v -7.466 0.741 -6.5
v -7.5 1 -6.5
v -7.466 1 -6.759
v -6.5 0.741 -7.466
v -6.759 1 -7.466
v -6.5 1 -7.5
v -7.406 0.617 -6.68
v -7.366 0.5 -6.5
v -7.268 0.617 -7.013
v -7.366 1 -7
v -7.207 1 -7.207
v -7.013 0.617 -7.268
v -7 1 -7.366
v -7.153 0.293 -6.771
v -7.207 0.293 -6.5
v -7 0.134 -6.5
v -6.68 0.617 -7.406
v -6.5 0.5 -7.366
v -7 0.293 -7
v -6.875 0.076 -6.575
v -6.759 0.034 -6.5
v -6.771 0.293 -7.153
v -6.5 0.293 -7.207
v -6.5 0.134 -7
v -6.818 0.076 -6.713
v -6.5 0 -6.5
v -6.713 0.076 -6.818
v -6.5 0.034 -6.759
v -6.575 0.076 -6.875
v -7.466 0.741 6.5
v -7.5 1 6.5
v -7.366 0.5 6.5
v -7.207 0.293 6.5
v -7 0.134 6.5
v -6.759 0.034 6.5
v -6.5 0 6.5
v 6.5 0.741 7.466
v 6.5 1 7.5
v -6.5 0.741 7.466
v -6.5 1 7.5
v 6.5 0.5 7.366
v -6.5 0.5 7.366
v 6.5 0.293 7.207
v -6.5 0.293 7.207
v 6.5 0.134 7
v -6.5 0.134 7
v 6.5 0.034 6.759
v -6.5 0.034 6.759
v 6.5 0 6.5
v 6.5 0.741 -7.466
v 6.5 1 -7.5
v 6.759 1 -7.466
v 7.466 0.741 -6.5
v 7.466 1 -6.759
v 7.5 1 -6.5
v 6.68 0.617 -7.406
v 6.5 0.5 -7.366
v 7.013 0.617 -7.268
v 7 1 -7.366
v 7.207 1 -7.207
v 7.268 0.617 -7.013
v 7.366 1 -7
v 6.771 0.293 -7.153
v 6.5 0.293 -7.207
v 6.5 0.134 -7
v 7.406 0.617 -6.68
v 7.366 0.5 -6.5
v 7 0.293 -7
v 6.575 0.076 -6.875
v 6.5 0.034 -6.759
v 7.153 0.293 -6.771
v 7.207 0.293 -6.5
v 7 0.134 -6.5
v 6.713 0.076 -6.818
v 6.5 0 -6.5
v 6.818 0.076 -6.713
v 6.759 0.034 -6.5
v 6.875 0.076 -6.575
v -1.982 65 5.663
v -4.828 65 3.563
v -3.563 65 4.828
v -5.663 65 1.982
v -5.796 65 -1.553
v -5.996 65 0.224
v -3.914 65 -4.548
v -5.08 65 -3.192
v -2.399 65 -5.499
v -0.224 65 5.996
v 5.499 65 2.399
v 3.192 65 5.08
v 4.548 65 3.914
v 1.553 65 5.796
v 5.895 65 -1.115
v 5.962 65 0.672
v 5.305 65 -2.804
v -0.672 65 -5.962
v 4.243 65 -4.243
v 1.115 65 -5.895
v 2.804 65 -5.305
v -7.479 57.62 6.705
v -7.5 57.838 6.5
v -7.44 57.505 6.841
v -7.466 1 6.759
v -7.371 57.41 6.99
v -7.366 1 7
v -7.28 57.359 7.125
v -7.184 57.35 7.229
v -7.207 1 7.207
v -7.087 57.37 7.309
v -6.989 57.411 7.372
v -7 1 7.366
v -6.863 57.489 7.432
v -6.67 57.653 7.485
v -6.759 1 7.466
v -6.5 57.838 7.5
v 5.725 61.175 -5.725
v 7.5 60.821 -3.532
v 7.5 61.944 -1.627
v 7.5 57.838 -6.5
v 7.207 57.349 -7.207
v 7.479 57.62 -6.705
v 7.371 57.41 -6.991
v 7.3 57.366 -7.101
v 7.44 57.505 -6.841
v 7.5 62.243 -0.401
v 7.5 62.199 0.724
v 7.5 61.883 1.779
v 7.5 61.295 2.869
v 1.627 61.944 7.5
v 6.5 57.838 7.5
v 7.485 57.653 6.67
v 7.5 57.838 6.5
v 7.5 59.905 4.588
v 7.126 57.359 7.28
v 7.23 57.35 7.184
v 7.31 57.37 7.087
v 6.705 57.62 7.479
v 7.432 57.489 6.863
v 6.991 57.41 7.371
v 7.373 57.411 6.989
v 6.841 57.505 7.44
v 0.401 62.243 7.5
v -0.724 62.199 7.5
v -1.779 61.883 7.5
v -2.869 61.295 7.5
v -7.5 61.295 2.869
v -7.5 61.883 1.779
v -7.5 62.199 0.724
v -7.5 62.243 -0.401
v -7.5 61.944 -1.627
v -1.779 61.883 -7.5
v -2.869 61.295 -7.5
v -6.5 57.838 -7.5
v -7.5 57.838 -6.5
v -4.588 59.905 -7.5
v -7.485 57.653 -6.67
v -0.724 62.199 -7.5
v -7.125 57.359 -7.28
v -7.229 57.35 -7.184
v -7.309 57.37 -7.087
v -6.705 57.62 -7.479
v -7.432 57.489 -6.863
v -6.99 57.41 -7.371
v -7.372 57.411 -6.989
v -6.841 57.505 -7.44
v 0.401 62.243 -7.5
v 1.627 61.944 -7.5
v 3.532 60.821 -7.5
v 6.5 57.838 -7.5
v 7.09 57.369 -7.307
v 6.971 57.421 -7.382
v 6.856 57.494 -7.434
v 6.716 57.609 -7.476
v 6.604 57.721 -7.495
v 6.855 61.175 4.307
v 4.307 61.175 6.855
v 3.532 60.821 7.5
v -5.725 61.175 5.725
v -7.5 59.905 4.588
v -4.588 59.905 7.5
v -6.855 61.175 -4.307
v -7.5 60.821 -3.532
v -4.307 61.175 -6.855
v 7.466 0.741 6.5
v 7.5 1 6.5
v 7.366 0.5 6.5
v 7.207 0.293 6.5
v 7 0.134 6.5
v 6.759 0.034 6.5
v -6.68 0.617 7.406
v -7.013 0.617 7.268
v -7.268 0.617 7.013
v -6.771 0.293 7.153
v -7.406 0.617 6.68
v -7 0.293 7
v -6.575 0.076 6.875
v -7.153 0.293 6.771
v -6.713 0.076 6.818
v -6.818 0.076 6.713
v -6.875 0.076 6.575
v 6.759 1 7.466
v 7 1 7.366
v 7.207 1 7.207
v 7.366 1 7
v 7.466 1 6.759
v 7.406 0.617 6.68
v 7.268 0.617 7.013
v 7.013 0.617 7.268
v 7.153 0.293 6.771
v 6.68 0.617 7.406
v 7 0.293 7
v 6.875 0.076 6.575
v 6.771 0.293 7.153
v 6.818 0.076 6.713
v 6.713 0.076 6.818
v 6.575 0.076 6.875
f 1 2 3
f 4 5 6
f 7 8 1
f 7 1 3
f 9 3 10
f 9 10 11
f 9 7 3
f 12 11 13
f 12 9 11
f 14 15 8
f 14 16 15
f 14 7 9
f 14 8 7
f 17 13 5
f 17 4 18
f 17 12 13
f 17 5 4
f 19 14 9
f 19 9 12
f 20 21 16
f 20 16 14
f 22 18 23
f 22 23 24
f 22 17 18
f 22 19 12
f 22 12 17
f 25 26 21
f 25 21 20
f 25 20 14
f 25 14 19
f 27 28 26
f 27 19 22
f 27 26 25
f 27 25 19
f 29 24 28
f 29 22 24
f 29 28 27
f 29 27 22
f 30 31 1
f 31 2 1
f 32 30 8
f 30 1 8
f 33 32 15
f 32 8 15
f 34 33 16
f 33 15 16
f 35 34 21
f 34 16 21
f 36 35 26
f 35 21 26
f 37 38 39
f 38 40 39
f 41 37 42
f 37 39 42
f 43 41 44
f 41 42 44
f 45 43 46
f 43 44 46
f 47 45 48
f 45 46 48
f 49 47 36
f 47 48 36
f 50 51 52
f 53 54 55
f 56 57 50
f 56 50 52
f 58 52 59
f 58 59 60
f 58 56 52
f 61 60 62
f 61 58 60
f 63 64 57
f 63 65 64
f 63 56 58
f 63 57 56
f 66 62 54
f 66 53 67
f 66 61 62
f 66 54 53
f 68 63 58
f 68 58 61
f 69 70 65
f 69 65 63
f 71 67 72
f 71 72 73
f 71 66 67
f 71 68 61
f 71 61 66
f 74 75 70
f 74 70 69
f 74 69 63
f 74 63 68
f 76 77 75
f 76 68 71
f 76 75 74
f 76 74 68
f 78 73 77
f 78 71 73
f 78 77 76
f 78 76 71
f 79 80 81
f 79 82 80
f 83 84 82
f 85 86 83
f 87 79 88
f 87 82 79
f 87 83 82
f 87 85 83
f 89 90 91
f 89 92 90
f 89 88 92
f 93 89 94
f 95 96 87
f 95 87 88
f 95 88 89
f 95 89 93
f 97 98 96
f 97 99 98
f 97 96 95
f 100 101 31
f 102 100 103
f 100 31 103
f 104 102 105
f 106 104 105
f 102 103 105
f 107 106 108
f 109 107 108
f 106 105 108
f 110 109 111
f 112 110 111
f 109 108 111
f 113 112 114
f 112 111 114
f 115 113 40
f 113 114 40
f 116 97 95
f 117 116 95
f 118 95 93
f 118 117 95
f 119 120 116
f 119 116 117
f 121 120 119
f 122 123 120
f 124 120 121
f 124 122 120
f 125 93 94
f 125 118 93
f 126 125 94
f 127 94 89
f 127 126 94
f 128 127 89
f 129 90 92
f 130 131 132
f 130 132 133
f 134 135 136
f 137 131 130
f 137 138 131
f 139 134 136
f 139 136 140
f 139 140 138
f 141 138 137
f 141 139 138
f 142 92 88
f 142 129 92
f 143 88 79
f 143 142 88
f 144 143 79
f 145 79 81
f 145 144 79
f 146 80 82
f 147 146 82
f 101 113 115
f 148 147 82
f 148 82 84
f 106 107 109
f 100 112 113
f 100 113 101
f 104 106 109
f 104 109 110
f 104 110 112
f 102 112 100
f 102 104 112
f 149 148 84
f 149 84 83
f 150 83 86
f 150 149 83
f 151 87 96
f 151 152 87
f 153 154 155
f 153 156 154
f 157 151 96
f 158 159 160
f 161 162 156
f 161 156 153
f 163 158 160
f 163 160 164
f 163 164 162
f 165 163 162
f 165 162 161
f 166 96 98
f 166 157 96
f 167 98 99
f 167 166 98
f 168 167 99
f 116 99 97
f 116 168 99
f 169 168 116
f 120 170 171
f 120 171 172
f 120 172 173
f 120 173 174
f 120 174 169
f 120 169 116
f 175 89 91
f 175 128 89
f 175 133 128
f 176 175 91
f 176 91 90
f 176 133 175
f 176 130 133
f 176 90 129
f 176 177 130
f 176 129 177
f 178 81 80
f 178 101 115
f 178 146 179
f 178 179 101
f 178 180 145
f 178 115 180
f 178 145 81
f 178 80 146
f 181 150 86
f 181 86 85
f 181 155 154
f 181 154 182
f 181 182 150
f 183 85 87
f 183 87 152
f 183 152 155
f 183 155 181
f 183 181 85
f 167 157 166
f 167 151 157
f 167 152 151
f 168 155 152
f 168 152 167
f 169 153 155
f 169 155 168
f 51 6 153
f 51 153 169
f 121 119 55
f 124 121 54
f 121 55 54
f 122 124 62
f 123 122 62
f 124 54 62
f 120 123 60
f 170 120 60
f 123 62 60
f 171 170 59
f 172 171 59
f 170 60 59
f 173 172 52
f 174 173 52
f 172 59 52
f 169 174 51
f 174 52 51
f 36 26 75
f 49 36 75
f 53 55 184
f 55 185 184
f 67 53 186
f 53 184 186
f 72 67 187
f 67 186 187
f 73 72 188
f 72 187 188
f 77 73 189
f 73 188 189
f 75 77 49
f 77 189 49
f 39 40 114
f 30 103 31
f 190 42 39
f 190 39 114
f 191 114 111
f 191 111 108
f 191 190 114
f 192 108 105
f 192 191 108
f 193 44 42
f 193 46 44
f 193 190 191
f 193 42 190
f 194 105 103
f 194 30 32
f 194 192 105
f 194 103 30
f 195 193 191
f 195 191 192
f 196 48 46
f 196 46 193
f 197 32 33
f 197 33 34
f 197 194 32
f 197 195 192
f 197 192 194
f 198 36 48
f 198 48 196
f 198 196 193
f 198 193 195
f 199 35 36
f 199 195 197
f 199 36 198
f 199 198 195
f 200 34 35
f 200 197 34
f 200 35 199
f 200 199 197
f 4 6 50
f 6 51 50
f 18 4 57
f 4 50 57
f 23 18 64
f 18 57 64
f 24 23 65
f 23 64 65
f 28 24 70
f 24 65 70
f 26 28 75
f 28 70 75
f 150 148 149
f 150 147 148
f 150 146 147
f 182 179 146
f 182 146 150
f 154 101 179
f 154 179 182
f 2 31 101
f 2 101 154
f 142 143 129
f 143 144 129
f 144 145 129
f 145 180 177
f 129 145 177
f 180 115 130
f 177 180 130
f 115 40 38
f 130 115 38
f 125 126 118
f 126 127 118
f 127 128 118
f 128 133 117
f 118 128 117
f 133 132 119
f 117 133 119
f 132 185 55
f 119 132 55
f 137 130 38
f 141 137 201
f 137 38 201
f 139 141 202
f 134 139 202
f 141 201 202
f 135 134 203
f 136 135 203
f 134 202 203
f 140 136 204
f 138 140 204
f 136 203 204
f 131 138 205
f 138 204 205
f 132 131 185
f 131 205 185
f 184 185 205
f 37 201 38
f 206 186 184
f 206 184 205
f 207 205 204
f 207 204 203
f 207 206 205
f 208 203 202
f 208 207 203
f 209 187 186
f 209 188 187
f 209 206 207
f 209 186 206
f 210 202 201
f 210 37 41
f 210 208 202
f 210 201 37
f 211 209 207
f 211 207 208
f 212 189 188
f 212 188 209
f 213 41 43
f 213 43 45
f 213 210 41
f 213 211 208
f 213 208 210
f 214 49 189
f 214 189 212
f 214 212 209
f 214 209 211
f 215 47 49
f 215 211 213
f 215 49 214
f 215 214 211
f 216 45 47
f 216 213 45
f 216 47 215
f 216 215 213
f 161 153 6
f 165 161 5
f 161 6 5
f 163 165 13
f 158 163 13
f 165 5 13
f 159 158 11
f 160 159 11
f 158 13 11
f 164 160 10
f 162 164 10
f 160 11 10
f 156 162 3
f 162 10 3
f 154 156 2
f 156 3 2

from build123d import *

# Parameters (mm, degrees)
SKETCH1_W           = 15
SKETCH1_H           = 15
BOSS_EXTRUDE1_DEPTH = 65
FILLET1_R           = 1
FILLET2_R           = 1


with BuildPart() as part:
    # Sketch1 → Boss-Extrude1 (new body)
    with BuildSketch(Plane(origin=(0, 0, 0), x_dir=(1, 0, 0), z_dir=(0, 1, 0))):
        Rectangle(SKETCH1_W, SKETCH1_H)
    extrude(amount=BOSS_EXTRUDE1_DEPTH)

    # Sketch2 → Cut-Revolve4 (revolve, cut)
    with BuildSketch(Plane.XY):
        Polygon((6, 65), (10.984781161, 55.903414997), (10.984781161, 65), align=None)
    revolve(axis=Axis((0, 73.5, 0), (0, -1, 0)), mode=Mode.SUBTRACT)

    # Fillet1
    fillet1_edges = [part.edges().sort_by_distance(p)[0] for p in [
        (-7.5, 28.29677194, -7.5),
        (7.5, 28.29677194, -7.5),
        (7.5, 28.29677194, 7.5),
        (-7.5, 28.29677194, 7.5),
    ]]
    fillet(fillet1_edges, radius=FILLET1_R)

    # Fillet2
    fillet2_edges = [part.edges().sort_by_distance(p)[0] for p in [
        (-7.207106781, 0, 7.207106781),
        (-7.5, 0, 0),
        (-7.207106781, 0, -7.207106781),
        (0, 0, -7.5),
        (7.207106781, 0, -7.207106781),
        (7.5, 0, 0),
        (7.207106781, 0, 7.207106781),
        (0, 0, 7.5),
    ]]
    fillet(fillet2_edges, radius=FILLET2_R)


solid = part.part
